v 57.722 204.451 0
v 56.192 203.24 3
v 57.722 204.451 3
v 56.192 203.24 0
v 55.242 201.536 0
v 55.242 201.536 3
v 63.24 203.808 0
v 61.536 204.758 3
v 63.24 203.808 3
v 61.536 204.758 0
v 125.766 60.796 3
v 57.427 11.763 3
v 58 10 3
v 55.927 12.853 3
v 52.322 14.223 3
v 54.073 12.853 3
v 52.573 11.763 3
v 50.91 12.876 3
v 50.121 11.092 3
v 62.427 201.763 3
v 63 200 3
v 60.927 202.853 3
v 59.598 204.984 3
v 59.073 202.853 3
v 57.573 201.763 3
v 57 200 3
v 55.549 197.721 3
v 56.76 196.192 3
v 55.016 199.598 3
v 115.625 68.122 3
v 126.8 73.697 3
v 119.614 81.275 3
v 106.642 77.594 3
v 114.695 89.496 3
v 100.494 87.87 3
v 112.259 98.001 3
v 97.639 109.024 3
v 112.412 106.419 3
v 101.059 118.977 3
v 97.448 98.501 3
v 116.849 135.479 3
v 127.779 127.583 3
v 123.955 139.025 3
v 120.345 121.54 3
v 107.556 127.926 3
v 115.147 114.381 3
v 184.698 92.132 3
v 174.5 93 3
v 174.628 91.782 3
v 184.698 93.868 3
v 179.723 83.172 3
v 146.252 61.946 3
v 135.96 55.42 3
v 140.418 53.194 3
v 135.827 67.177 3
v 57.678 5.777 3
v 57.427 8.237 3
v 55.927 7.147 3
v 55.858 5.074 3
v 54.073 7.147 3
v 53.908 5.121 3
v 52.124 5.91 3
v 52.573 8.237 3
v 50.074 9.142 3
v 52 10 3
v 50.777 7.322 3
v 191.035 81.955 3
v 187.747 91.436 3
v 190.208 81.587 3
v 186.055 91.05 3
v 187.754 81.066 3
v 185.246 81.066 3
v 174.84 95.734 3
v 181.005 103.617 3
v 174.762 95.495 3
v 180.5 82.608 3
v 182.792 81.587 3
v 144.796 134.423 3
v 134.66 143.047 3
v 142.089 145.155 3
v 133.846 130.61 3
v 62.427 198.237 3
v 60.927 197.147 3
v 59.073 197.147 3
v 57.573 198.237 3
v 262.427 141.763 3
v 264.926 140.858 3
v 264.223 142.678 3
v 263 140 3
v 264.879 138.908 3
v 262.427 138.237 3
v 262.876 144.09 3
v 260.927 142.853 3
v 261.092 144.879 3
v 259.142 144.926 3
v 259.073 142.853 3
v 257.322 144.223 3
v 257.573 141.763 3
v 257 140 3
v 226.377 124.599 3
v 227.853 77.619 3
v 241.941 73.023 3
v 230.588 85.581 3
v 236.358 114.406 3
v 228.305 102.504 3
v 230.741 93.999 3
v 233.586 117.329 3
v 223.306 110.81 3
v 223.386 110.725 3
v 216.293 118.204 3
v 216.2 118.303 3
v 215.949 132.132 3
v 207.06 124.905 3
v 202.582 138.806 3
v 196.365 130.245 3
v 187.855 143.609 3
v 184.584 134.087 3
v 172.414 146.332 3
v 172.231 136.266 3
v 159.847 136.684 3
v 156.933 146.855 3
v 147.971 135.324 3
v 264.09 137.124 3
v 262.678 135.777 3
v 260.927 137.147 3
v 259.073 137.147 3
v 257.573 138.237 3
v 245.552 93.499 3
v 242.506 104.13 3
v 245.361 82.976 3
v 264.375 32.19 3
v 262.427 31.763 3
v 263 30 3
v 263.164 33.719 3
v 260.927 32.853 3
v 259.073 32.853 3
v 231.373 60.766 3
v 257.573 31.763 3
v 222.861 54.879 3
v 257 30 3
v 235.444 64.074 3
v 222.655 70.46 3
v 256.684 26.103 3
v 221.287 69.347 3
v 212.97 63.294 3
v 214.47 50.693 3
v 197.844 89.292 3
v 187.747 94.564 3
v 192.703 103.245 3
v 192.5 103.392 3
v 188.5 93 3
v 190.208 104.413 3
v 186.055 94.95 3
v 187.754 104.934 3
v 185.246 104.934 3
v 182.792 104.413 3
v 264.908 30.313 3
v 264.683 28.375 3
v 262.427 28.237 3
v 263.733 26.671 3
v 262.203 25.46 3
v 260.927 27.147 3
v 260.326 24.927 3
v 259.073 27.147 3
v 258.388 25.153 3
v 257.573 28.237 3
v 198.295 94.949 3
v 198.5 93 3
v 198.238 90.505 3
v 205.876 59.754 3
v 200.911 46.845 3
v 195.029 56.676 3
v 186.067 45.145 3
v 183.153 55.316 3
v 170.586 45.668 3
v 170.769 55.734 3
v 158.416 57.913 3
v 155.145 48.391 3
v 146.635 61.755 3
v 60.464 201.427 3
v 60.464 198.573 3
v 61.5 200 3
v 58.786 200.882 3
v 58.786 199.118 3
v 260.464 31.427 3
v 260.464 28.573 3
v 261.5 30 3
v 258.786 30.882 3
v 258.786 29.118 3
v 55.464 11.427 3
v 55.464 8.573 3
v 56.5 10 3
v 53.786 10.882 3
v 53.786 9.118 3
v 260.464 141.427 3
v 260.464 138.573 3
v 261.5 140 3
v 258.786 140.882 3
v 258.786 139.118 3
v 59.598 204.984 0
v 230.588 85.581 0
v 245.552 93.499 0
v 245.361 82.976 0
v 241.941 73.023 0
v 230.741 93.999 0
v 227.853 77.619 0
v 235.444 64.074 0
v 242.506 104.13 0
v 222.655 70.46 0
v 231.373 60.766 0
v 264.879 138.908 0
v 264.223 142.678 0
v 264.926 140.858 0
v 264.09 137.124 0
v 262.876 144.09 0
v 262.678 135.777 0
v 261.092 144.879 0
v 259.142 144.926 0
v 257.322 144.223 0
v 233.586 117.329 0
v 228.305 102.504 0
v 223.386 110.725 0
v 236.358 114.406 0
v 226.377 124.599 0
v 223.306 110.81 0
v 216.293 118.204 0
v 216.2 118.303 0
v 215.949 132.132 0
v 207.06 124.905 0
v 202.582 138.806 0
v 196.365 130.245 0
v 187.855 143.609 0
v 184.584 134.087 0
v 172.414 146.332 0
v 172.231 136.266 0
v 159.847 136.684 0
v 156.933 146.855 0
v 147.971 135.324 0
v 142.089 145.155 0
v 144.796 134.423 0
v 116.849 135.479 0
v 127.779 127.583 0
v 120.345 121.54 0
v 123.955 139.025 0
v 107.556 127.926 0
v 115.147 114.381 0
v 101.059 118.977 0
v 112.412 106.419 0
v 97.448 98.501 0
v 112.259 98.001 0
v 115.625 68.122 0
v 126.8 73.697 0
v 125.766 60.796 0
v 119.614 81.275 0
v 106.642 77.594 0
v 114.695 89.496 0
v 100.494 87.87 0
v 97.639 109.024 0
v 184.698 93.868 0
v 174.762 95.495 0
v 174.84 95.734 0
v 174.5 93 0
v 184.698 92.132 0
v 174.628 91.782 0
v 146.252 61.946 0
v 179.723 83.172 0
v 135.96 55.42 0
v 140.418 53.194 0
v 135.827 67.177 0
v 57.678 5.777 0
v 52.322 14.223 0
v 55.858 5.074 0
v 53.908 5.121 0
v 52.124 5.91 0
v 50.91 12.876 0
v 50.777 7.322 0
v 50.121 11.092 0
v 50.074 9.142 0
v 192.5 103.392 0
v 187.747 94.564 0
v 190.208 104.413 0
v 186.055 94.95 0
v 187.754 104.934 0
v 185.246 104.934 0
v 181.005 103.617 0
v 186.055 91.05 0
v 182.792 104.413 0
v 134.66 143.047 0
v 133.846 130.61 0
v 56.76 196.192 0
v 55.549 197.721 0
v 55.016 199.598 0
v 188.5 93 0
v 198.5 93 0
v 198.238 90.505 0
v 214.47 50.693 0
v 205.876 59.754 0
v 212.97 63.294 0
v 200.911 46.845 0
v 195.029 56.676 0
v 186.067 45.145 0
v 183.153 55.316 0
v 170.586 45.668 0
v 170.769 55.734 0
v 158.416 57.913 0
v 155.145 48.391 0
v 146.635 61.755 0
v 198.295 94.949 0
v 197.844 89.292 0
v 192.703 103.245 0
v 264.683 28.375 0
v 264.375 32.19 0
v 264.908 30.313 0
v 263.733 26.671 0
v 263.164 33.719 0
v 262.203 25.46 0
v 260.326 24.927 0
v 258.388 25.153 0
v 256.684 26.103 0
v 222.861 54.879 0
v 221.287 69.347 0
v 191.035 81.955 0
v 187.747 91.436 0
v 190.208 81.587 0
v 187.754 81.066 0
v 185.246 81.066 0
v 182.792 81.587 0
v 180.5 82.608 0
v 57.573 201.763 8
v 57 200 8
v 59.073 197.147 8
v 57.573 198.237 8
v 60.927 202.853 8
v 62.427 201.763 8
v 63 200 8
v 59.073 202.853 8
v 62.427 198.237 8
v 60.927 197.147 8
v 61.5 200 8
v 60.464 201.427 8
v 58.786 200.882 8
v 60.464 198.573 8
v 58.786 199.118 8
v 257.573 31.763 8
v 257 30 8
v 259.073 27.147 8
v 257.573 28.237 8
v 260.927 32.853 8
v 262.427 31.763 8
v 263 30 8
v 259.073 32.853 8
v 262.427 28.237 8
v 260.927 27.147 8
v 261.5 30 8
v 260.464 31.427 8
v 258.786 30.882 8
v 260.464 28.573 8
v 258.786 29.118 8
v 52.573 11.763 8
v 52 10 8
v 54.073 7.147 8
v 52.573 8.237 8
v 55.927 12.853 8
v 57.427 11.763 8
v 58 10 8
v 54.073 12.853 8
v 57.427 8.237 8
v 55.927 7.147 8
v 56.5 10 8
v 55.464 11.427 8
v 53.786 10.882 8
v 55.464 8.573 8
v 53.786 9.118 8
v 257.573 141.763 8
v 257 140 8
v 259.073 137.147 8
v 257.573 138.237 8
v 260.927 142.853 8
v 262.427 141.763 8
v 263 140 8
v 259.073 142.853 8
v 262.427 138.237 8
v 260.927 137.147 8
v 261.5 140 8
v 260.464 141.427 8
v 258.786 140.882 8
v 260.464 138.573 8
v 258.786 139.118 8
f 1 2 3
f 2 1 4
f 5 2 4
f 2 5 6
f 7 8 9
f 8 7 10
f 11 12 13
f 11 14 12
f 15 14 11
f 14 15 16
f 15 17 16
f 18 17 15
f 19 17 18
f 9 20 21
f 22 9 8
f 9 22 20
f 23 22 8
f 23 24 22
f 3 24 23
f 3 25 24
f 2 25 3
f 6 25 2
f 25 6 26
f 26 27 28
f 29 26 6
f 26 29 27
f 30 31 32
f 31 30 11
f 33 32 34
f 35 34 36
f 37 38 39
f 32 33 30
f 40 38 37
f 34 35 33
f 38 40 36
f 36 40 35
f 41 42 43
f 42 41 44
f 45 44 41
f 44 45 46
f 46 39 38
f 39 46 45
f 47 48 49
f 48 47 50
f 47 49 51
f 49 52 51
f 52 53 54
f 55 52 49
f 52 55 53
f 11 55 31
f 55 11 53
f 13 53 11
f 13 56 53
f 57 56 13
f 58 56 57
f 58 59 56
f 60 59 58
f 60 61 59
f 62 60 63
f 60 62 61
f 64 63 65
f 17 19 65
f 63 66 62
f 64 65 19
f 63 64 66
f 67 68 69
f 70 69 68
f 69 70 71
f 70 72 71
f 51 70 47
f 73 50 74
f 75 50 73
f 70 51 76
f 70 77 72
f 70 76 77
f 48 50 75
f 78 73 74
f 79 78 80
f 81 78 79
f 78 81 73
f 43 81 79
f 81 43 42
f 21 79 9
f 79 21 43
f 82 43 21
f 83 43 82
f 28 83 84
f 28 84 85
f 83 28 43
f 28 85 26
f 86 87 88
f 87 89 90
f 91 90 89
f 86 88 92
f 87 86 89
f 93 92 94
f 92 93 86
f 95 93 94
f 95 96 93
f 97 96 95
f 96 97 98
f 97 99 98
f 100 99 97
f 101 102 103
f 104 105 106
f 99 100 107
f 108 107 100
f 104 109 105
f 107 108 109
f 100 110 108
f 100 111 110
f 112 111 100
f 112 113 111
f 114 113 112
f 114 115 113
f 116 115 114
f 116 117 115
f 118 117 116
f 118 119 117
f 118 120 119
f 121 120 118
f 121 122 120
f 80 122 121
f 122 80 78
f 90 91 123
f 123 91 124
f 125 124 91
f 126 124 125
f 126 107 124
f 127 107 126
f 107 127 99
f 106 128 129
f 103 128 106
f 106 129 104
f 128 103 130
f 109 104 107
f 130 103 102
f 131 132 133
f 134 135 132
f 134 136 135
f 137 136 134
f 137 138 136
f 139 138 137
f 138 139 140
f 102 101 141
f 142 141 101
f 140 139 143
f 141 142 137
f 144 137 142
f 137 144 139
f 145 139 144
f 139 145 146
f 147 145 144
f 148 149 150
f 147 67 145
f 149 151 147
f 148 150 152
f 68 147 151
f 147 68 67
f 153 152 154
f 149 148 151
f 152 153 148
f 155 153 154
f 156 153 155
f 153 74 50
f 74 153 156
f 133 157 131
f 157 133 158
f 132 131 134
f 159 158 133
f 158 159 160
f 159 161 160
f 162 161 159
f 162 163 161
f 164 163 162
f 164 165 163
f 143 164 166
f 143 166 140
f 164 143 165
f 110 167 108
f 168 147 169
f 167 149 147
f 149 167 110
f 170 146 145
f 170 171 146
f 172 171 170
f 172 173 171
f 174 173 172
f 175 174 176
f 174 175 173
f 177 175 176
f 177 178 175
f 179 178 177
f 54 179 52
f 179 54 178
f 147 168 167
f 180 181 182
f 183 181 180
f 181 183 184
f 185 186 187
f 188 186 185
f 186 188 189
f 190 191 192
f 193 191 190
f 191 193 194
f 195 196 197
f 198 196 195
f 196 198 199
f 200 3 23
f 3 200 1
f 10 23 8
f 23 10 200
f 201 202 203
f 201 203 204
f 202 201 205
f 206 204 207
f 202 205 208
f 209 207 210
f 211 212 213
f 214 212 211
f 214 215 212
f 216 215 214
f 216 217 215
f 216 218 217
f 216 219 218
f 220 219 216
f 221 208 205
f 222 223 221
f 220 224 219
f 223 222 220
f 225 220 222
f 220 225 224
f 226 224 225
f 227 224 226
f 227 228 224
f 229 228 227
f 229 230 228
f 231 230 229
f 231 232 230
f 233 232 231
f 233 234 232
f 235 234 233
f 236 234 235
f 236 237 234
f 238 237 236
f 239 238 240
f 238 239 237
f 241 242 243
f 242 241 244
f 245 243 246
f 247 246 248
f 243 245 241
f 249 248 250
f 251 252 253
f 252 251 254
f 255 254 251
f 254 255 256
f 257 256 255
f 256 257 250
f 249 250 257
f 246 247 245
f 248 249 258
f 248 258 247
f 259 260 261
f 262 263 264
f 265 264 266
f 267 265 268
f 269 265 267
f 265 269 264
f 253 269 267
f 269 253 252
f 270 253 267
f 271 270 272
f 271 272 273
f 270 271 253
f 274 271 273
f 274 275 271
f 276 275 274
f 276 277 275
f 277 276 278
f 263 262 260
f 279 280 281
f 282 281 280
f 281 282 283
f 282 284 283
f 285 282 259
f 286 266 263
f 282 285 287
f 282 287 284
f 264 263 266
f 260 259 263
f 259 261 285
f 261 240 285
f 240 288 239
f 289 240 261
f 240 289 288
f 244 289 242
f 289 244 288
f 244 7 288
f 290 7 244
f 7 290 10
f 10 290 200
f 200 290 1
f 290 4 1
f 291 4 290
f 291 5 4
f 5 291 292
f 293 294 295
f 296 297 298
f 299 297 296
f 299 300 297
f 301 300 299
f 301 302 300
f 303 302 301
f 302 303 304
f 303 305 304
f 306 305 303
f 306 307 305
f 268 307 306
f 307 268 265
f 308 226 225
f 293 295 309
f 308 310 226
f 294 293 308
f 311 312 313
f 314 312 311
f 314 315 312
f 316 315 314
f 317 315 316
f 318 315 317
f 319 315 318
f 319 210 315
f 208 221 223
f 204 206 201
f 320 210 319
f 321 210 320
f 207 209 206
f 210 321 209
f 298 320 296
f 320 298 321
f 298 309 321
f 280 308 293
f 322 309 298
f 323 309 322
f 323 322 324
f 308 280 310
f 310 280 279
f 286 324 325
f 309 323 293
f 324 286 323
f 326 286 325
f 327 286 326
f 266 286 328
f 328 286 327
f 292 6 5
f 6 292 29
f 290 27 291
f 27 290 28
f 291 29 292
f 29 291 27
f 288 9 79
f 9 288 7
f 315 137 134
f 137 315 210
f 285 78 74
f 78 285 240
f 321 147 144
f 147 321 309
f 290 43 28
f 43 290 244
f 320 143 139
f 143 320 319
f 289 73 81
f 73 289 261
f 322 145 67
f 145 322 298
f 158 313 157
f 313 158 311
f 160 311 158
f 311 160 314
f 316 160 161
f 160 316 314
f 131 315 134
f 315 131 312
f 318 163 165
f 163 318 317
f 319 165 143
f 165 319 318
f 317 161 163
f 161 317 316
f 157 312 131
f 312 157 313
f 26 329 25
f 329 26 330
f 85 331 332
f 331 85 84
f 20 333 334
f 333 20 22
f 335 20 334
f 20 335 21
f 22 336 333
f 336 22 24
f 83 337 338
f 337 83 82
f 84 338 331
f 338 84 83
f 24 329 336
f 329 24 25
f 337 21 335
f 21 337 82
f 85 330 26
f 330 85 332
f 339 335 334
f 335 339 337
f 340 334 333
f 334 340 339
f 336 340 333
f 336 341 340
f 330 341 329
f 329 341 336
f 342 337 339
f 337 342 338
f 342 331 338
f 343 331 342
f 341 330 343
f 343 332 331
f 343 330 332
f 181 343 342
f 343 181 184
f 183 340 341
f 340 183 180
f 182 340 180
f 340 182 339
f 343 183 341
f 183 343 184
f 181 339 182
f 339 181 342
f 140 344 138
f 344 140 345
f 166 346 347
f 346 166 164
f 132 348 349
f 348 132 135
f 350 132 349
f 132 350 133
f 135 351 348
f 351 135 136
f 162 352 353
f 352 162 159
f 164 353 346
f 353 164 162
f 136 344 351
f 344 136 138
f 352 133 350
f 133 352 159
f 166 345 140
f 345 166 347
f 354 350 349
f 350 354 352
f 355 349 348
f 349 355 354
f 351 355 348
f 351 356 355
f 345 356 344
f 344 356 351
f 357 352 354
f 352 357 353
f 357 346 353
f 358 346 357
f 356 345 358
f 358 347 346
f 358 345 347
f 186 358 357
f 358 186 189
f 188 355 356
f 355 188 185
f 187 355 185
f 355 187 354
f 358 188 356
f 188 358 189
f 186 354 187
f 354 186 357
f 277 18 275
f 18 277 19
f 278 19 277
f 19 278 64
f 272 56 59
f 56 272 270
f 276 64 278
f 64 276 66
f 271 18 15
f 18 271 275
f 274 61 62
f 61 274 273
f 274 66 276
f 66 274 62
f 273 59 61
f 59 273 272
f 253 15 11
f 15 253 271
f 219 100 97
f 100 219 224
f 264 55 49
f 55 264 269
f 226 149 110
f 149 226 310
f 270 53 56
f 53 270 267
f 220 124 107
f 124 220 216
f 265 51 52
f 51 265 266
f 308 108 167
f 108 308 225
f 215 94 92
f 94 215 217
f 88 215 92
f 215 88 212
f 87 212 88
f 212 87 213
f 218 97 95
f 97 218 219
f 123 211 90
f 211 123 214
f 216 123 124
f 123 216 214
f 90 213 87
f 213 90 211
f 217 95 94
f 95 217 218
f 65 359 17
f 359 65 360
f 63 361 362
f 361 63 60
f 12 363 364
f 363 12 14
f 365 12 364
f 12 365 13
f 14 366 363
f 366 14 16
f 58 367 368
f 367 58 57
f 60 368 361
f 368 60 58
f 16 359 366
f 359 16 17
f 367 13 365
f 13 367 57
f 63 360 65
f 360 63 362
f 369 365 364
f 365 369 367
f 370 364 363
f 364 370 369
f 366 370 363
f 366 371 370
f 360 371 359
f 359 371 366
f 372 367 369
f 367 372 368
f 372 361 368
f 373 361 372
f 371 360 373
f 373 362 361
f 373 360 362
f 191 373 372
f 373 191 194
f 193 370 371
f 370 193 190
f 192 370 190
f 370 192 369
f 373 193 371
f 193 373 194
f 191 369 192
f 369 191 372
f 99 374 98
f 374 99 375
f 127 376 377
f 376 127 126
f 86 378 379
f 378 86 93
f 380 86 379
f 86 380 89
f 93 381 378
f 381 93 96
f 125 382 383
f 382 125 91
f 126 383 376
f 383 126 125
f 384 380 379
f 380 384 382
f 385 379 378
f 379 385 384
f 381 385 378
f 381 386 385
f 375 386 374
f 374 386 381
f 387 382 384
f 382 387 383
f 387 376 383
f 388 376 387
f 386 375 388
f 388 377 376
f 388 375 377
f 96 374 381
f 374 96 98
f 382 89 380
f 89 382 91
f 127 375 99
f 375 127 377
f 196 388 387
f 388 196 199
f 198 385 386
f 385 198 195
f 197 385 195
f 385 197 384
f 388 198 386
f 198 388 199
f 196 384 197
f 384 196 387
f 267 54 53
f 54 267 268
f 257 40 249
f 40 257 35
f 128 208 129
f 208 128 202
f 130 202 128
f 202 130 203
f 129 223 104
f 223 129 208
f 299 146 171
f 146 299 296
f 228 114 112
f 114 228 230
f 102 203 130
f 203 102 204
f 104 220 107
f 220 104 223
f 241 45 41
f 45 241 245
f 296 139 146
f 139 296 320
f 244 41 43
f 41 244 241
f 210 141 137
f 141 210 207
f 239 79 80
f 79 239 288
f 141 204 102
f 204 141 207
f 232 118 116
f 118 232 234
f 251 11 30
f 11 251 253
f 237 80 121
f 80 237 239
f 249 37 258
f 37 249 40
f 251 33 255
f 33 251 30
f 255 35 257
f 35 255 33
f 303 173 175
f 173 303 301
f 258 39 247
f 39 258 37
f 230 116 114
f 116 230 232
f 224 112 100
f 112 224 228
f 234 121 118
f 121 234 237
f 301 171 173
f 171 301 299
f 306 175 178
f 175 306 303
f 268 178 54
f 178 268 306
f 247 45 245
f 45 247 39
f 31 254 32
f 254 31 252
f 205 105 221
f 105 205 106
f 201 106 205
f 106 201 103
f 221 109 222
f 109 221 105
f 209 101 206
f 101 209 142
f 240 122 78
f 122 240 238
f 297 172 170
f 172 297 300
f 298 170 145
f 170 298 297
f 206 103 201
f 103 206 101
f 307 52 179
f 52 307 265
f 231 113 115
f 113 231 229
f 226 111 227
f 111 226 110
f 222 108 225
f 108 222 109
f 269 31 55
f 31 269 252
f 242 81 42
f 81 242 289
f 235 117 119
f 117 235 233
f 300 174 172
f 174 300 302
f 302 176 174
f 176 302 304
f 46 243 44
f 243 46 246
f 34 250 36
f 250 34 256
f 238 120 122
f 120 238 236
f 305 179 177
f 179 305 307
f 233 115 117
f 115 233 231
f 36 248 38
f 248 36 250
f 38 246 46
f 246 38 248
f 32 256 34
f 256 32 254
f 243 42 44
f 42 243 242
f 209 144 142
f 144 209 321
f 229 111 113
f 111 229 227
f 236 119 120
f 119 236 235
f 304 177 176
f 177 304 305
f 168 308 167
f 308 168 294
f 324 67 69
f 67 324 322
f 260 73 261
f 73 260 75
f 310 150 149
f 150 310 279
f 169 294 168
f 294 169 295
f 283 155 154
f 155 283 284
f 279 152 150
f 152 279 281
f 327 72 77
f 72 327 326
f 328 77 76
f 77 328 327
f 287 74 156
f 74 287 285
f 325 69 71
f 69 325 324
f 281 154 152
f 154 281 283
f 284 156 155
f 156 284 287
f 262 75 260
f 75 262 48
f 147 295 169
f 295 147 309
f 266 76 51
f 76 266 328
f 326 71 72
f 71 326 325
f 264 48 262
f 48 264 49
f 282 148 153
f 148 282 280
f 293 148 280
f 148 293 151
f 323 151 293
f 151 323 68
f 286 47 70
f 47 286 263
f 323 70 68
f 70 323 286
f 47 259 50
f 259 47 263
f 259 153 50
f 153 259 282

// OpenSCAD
// file: 3rdparty.scad
// -------------------------------
// 3rd party stuff
// -------------------------------




/*----------------------------------------------------------------------------*
* Defines common constants used throughout the AutoSCAD libraries.
*-----------------------------------------------------------------------------*
*----------------------------------------------------------------------------*/

//--- Constants

/** The value of Pi
 */
PI = 3.1415926535897932;

/** Printer resolution (in mm)
 */
RESOLUTION = 0.3;

/** Base size for objects (in mm)
 *
 * The library is designed to generate things in 'units' - this defines the
 * size of a unit (in mm).
 */
BASE_SIZE = 2;

//--- Modules

/** Create an isosceles triangle
 *
 * The middle of the base is at origin (0, 0, 0) and the tip of the triangle
 * points along the Y axis. Depth is in the Z axis and is centered on the
 * origin. If depth is not specified it defaults to 2 units.
 */
module triangle(width, height, depth = 2) {
  angle = atan(height / (width / 2));
  difference() {
    translate(v = [ 0, height / 2, 0 ]) {
      cube(size = [ width, height, depth ], center = true);
      }
    translate(v = [ width / 2, 0, 0 ]) {
      rotate(a = [ 0, 0, 90 - angle ]) {
        translate(v = [ width / 2, height, 0 ]) {
          cube(size = [ width, height * 2, depth * 2 ], center = true);
          }
        }
      }
    translate(v = [ -width / 2, 0, 0 ]) {
      rotate(a = [ 0, 0, 270 + angle ]) {
        translate(v = [ -width / 2, height, 0 ]) {
          cube(size = [ width, height * 2, depth * 2 ], center = true);
          }
        }
      }
    }
  }

/** Create an arc
 *
 * Creates a slice of a cylinder that is 'width' along the X axis, 'height'
 * along the Y axis and 'depth' along the Z axis. The base (the flat part)
 * is centered on the origin. If 'depth' is not specified it defaults to
 * 2 units.
 */
module arc(width, height, depth = 2) {
  radius = ((width * width) + (4 * height * height)) / (8 * height);
  difference() {
    translate(v = [ 0, -(radius - height), 0 ]) {
      cylinder(h = depth, r = radius, center = true, $fs = RESOLUTION);
      }
    translate(v = [ 0, -radius, 0 ]) {
      cube(size = [ radius * 2, radius * 2, depth * 2 ], center = true);
      }
    }
  }

/** Calculates the height of a teardrop with a given radius
 */
function teardrop_length(td_radius) = td_radius + sqrt(2 * (td_radius * td_radius));

/** Generate a teardrop shape
 *
 * These shapes are useful for minimising print volume while maintaining
 * structural strength.
 */
module teardrop(td_radius, td_height = 1) {
  translate(v = [ 0, -(teardrop_length(td_radius) - td_radius), 0 ]) {
    rotate(a = [ 0, 0, 45 ]) {
      linear_extrude(height = td_height) {
        union() {
          circle(r = td_radius, $fs = RESOLUTION);
          square(size = [ td_radius, td_radius ]);
          }
        }
      }
    }
  }

/** Variation of the teardrop with a specified length
 *
 * This module allows you to specify the length of the teardrop shape as well
 * as the radius.
 */
module teardrop_scaled(td_radius, td_length, td_height = 1) {
  scale_factor = td_length / teardrop_length(td_radius);
  scale(v = [ 1, scale_factor, 1 ]) {
    teardrop(td_radius, td_height);
    }
  }

/** Create a hexagon.
 *
 * The 'size' parameter specifies the distance from the center of the
 * hexagon to the center of one of the six straight edges. The 'depth'
 * parameter specifies the size in the Z axis. The resulting object
 * is centered on the origin.
 */
module hexagon(length, depth = 2) {
  width = 2 * length * tan(30);
  union() {
    cube(size = [ length * 2, width, depth ], center = true);
    rotate(a = [ 0, 0, 60 ]) {
      cube(size = [ length * 2, width, depth ], center = true);
      }
    rotate(a = [ 0, 0, -60 ]) {
      cube(size = [ length * 2, width, depth ], center = true);
      }
    }
  }

/** Create a hexagon
 *
 * The 'radius' parameter specifies the radius of the smallest circle
 * that contains the hexagon. The 'depth' parameter specifies the size
 * in the Z axis. The resulting object is centered on the origin.
 */
module hexagonR(radius, depth = 2) {
  hexagon(radius * cos(30), depth);
  }

/** Create a hexagon
 *
 * This version of the hexagon module creates a hexagon where each
 * edge is of 'part' length. The 'depth' parameter specifies the
 * size in the Z axis. The resulting object is centered on the
 * origin.
 */
module hexagonL(part, depth = 2) {
  hexagon((part / 2) / tan(30), depth);
  }

/** Create a rounded rectangle
 */
module roundrect(width, height, depth, radius) {
  union() {
    // Make the four corner pieces
    translate(v = [ width / 2 - radius, height / 2 - radius, 0 ]) {
      cylinder(r = radius, h = depth, center = true);
    }
    translate(v = [ width / 2 - radius, -(height / 2 - radius), 0 ]) {
      cylinder(r = radius, h = depth, center = true);
    }
    translate(v = [ -(width / 2 - radius), height / 2 - radius, 0 ]) {
      cylinder(r = radius, h = depth, center = true);
    }
     translate(v = [ -(width / 2 - radius), -(height / 2 - radius), 0 ]) {
       cylinder(r = radius, h = depth, center = true);
       }
    // Add the center rectangles
    cube(size = [ width - (2 * radius), height, depth ], center = true);
    cube(size = [ width, height - (2 * radius), depth ], center = true);
    }
  }
// file: modules.scad
use <3rdparty.scad>;

// module library

// tube - make a tube
//
// ro = outer radius
// ri = inner radius
// height = height
//
module tube(ro, ri, height) {
	difference() {
		cylinder(h=height, r=ro);
		cylinder(h=height, r=ri);
	}
}



// screwWithNut - draws a screw with nut. the object is placed
//                in z-direction centered at the origin
// 
// nr: radius of the nut
// nd: nut depth
// s:  space between nut and screen head
// sd: srew depth
// sr: screwRadius
// wp: with projection
// 
module screwWithNut(nr=5, nd=6.5, s=4, sd=6.5, sr=2.6, wp=0) {
	union() {
		translate([0, 0, sd/2]) hexagon(length = nr, depth = sd);
		translate([0, 0, sd]) cylinder(h=s, r=sr);
		translate([0, 0, s + nd/2 + sd]) hexagon(length = nr, depth = nd);
		if (wp > 0) {
			translate([-nr, 0, 0]) cube([2*nr, wp, sd]);
			translate([-nr, 0, s + sd]) cube([2*nr, wp, nd]);
		}
	}
}
// main file
use <modules.scad>;

// increase resolution
//$fn = 100;


// ---------------------------------------------------
// properties
// ---------------------------------------------------

hCon=3;	// height of the connectors
hSockel=8;	// height of the sockel
radius=3;
strength=10;
radiusScrew=1.5;
radiusScrew2=2;

// these values are based on arduino leonardo
b1=[[60,200], [260,30]];
b2=[[55,10],[260,140]];

// ---------------------------------------------------
// preprocessing
// ---------------------------------------------------

_dx1=b1[1][0]-b1[0][0];
_dy1=b1[1][1]-b1[0][1];

_dx2=b2[1][0]-b2[0][0];
_dy2=b2[1][1]-b2[0][1];

_l1=sqrt(pow(_dx1, 2) + pow(_dy1, 2));
_l2=sqrt(pow(_dx2, 2) + pow(_dy2, 2));

//_a1=360-asin(_dx1/_l1);
_a1=319.61;	// guessing... => somehow I screwd up the calculation
_a2=90-asin(_dx2/_l2);

// compute straight function for first two points

//     y2 - y1
// a = ———————
//     x2 - x1
//
// b  =  y2 - a·x2

_sa1=(b1[1][1]-b1[0][1])/(b1[1][0]-b1[0][0]);
_sb1=b1[0][1]-b1[0][0]*_sa1;

echo(_sa1, _sb1);

/*
for(i=[-5:20]) {
	translate([i*5, i*_sa1+_sb1, 0]) cylinder(h=8, r=0.8);
}

for(i=[-5:20]) {
	translate([i*5, i*5, 0]) cylinder(h=12, r=1.2);
}
*/

// ---------------------------------------------------
// shapes
// ---------------------------------------------------

_m1=[186.5,93];	// guessing... => somehow I screwd up the calculation 

difference() {
	_base();
	translate([_m1[0], _m1[1], 0]) cylinder(r=radiusScrew2, h=hCon);
}

module _base() {
	union() {
		_cons();
		translate([_m1[0], _m1[1], 0]) cylinder(r=12, h=hCon);
		//translate([_m1[0]-5, _m1[1]+1, 0]) rotate(a=[0, 0, -10]) scale([1.5, 1, 1]) tube(40,35, hCon);
		translate([_m1[0]-15, _m1[1]+3, 0]) rotate(a=[0, 0, -10]) scale([1.5, 1, 1]) tube(50,40, hCon);
	}
}

module _cons() {
	union() {
		_con(b1, _l1, _a1);
		_con(b2, _l2, _a2);
	}
}

module _con(p, l, a) {
	union() {
		_conBase(p, l, a);
		_conPins(p);
	}
}

module _conBase(p, l, a) {
	translate([p[0][0], p[0][1], 0]) {
		rotate(a=[0, 0, a]) {
			union() {
				cylinder(h=hCon, r=strength/2);
				translate([0, -strength/2, 0]) cube([l, strength, hCon]);
				translate([l, 0, 0]) cylinder(h=hCon, r=strength/2);
			}
		}
	}
}

module _conPins(p) {
	union() {
		difference() {
			translate([p[0][0], p[0][1], 0]) cylinder(h=hSockel, r=radius);
			translate([p[0][0], p[0][1], 0]) cylinder(h=hSockel, r=radiusScrew);
		}
		difference() {
			translate([p[1][0], p[1][1], 0]) cylinder(h=hSockel, r=radius);
			translate([p[1][0], p[1][1], 0]) cylinder(h=hSockel, r=radiusScrew);
		}
	}
}
